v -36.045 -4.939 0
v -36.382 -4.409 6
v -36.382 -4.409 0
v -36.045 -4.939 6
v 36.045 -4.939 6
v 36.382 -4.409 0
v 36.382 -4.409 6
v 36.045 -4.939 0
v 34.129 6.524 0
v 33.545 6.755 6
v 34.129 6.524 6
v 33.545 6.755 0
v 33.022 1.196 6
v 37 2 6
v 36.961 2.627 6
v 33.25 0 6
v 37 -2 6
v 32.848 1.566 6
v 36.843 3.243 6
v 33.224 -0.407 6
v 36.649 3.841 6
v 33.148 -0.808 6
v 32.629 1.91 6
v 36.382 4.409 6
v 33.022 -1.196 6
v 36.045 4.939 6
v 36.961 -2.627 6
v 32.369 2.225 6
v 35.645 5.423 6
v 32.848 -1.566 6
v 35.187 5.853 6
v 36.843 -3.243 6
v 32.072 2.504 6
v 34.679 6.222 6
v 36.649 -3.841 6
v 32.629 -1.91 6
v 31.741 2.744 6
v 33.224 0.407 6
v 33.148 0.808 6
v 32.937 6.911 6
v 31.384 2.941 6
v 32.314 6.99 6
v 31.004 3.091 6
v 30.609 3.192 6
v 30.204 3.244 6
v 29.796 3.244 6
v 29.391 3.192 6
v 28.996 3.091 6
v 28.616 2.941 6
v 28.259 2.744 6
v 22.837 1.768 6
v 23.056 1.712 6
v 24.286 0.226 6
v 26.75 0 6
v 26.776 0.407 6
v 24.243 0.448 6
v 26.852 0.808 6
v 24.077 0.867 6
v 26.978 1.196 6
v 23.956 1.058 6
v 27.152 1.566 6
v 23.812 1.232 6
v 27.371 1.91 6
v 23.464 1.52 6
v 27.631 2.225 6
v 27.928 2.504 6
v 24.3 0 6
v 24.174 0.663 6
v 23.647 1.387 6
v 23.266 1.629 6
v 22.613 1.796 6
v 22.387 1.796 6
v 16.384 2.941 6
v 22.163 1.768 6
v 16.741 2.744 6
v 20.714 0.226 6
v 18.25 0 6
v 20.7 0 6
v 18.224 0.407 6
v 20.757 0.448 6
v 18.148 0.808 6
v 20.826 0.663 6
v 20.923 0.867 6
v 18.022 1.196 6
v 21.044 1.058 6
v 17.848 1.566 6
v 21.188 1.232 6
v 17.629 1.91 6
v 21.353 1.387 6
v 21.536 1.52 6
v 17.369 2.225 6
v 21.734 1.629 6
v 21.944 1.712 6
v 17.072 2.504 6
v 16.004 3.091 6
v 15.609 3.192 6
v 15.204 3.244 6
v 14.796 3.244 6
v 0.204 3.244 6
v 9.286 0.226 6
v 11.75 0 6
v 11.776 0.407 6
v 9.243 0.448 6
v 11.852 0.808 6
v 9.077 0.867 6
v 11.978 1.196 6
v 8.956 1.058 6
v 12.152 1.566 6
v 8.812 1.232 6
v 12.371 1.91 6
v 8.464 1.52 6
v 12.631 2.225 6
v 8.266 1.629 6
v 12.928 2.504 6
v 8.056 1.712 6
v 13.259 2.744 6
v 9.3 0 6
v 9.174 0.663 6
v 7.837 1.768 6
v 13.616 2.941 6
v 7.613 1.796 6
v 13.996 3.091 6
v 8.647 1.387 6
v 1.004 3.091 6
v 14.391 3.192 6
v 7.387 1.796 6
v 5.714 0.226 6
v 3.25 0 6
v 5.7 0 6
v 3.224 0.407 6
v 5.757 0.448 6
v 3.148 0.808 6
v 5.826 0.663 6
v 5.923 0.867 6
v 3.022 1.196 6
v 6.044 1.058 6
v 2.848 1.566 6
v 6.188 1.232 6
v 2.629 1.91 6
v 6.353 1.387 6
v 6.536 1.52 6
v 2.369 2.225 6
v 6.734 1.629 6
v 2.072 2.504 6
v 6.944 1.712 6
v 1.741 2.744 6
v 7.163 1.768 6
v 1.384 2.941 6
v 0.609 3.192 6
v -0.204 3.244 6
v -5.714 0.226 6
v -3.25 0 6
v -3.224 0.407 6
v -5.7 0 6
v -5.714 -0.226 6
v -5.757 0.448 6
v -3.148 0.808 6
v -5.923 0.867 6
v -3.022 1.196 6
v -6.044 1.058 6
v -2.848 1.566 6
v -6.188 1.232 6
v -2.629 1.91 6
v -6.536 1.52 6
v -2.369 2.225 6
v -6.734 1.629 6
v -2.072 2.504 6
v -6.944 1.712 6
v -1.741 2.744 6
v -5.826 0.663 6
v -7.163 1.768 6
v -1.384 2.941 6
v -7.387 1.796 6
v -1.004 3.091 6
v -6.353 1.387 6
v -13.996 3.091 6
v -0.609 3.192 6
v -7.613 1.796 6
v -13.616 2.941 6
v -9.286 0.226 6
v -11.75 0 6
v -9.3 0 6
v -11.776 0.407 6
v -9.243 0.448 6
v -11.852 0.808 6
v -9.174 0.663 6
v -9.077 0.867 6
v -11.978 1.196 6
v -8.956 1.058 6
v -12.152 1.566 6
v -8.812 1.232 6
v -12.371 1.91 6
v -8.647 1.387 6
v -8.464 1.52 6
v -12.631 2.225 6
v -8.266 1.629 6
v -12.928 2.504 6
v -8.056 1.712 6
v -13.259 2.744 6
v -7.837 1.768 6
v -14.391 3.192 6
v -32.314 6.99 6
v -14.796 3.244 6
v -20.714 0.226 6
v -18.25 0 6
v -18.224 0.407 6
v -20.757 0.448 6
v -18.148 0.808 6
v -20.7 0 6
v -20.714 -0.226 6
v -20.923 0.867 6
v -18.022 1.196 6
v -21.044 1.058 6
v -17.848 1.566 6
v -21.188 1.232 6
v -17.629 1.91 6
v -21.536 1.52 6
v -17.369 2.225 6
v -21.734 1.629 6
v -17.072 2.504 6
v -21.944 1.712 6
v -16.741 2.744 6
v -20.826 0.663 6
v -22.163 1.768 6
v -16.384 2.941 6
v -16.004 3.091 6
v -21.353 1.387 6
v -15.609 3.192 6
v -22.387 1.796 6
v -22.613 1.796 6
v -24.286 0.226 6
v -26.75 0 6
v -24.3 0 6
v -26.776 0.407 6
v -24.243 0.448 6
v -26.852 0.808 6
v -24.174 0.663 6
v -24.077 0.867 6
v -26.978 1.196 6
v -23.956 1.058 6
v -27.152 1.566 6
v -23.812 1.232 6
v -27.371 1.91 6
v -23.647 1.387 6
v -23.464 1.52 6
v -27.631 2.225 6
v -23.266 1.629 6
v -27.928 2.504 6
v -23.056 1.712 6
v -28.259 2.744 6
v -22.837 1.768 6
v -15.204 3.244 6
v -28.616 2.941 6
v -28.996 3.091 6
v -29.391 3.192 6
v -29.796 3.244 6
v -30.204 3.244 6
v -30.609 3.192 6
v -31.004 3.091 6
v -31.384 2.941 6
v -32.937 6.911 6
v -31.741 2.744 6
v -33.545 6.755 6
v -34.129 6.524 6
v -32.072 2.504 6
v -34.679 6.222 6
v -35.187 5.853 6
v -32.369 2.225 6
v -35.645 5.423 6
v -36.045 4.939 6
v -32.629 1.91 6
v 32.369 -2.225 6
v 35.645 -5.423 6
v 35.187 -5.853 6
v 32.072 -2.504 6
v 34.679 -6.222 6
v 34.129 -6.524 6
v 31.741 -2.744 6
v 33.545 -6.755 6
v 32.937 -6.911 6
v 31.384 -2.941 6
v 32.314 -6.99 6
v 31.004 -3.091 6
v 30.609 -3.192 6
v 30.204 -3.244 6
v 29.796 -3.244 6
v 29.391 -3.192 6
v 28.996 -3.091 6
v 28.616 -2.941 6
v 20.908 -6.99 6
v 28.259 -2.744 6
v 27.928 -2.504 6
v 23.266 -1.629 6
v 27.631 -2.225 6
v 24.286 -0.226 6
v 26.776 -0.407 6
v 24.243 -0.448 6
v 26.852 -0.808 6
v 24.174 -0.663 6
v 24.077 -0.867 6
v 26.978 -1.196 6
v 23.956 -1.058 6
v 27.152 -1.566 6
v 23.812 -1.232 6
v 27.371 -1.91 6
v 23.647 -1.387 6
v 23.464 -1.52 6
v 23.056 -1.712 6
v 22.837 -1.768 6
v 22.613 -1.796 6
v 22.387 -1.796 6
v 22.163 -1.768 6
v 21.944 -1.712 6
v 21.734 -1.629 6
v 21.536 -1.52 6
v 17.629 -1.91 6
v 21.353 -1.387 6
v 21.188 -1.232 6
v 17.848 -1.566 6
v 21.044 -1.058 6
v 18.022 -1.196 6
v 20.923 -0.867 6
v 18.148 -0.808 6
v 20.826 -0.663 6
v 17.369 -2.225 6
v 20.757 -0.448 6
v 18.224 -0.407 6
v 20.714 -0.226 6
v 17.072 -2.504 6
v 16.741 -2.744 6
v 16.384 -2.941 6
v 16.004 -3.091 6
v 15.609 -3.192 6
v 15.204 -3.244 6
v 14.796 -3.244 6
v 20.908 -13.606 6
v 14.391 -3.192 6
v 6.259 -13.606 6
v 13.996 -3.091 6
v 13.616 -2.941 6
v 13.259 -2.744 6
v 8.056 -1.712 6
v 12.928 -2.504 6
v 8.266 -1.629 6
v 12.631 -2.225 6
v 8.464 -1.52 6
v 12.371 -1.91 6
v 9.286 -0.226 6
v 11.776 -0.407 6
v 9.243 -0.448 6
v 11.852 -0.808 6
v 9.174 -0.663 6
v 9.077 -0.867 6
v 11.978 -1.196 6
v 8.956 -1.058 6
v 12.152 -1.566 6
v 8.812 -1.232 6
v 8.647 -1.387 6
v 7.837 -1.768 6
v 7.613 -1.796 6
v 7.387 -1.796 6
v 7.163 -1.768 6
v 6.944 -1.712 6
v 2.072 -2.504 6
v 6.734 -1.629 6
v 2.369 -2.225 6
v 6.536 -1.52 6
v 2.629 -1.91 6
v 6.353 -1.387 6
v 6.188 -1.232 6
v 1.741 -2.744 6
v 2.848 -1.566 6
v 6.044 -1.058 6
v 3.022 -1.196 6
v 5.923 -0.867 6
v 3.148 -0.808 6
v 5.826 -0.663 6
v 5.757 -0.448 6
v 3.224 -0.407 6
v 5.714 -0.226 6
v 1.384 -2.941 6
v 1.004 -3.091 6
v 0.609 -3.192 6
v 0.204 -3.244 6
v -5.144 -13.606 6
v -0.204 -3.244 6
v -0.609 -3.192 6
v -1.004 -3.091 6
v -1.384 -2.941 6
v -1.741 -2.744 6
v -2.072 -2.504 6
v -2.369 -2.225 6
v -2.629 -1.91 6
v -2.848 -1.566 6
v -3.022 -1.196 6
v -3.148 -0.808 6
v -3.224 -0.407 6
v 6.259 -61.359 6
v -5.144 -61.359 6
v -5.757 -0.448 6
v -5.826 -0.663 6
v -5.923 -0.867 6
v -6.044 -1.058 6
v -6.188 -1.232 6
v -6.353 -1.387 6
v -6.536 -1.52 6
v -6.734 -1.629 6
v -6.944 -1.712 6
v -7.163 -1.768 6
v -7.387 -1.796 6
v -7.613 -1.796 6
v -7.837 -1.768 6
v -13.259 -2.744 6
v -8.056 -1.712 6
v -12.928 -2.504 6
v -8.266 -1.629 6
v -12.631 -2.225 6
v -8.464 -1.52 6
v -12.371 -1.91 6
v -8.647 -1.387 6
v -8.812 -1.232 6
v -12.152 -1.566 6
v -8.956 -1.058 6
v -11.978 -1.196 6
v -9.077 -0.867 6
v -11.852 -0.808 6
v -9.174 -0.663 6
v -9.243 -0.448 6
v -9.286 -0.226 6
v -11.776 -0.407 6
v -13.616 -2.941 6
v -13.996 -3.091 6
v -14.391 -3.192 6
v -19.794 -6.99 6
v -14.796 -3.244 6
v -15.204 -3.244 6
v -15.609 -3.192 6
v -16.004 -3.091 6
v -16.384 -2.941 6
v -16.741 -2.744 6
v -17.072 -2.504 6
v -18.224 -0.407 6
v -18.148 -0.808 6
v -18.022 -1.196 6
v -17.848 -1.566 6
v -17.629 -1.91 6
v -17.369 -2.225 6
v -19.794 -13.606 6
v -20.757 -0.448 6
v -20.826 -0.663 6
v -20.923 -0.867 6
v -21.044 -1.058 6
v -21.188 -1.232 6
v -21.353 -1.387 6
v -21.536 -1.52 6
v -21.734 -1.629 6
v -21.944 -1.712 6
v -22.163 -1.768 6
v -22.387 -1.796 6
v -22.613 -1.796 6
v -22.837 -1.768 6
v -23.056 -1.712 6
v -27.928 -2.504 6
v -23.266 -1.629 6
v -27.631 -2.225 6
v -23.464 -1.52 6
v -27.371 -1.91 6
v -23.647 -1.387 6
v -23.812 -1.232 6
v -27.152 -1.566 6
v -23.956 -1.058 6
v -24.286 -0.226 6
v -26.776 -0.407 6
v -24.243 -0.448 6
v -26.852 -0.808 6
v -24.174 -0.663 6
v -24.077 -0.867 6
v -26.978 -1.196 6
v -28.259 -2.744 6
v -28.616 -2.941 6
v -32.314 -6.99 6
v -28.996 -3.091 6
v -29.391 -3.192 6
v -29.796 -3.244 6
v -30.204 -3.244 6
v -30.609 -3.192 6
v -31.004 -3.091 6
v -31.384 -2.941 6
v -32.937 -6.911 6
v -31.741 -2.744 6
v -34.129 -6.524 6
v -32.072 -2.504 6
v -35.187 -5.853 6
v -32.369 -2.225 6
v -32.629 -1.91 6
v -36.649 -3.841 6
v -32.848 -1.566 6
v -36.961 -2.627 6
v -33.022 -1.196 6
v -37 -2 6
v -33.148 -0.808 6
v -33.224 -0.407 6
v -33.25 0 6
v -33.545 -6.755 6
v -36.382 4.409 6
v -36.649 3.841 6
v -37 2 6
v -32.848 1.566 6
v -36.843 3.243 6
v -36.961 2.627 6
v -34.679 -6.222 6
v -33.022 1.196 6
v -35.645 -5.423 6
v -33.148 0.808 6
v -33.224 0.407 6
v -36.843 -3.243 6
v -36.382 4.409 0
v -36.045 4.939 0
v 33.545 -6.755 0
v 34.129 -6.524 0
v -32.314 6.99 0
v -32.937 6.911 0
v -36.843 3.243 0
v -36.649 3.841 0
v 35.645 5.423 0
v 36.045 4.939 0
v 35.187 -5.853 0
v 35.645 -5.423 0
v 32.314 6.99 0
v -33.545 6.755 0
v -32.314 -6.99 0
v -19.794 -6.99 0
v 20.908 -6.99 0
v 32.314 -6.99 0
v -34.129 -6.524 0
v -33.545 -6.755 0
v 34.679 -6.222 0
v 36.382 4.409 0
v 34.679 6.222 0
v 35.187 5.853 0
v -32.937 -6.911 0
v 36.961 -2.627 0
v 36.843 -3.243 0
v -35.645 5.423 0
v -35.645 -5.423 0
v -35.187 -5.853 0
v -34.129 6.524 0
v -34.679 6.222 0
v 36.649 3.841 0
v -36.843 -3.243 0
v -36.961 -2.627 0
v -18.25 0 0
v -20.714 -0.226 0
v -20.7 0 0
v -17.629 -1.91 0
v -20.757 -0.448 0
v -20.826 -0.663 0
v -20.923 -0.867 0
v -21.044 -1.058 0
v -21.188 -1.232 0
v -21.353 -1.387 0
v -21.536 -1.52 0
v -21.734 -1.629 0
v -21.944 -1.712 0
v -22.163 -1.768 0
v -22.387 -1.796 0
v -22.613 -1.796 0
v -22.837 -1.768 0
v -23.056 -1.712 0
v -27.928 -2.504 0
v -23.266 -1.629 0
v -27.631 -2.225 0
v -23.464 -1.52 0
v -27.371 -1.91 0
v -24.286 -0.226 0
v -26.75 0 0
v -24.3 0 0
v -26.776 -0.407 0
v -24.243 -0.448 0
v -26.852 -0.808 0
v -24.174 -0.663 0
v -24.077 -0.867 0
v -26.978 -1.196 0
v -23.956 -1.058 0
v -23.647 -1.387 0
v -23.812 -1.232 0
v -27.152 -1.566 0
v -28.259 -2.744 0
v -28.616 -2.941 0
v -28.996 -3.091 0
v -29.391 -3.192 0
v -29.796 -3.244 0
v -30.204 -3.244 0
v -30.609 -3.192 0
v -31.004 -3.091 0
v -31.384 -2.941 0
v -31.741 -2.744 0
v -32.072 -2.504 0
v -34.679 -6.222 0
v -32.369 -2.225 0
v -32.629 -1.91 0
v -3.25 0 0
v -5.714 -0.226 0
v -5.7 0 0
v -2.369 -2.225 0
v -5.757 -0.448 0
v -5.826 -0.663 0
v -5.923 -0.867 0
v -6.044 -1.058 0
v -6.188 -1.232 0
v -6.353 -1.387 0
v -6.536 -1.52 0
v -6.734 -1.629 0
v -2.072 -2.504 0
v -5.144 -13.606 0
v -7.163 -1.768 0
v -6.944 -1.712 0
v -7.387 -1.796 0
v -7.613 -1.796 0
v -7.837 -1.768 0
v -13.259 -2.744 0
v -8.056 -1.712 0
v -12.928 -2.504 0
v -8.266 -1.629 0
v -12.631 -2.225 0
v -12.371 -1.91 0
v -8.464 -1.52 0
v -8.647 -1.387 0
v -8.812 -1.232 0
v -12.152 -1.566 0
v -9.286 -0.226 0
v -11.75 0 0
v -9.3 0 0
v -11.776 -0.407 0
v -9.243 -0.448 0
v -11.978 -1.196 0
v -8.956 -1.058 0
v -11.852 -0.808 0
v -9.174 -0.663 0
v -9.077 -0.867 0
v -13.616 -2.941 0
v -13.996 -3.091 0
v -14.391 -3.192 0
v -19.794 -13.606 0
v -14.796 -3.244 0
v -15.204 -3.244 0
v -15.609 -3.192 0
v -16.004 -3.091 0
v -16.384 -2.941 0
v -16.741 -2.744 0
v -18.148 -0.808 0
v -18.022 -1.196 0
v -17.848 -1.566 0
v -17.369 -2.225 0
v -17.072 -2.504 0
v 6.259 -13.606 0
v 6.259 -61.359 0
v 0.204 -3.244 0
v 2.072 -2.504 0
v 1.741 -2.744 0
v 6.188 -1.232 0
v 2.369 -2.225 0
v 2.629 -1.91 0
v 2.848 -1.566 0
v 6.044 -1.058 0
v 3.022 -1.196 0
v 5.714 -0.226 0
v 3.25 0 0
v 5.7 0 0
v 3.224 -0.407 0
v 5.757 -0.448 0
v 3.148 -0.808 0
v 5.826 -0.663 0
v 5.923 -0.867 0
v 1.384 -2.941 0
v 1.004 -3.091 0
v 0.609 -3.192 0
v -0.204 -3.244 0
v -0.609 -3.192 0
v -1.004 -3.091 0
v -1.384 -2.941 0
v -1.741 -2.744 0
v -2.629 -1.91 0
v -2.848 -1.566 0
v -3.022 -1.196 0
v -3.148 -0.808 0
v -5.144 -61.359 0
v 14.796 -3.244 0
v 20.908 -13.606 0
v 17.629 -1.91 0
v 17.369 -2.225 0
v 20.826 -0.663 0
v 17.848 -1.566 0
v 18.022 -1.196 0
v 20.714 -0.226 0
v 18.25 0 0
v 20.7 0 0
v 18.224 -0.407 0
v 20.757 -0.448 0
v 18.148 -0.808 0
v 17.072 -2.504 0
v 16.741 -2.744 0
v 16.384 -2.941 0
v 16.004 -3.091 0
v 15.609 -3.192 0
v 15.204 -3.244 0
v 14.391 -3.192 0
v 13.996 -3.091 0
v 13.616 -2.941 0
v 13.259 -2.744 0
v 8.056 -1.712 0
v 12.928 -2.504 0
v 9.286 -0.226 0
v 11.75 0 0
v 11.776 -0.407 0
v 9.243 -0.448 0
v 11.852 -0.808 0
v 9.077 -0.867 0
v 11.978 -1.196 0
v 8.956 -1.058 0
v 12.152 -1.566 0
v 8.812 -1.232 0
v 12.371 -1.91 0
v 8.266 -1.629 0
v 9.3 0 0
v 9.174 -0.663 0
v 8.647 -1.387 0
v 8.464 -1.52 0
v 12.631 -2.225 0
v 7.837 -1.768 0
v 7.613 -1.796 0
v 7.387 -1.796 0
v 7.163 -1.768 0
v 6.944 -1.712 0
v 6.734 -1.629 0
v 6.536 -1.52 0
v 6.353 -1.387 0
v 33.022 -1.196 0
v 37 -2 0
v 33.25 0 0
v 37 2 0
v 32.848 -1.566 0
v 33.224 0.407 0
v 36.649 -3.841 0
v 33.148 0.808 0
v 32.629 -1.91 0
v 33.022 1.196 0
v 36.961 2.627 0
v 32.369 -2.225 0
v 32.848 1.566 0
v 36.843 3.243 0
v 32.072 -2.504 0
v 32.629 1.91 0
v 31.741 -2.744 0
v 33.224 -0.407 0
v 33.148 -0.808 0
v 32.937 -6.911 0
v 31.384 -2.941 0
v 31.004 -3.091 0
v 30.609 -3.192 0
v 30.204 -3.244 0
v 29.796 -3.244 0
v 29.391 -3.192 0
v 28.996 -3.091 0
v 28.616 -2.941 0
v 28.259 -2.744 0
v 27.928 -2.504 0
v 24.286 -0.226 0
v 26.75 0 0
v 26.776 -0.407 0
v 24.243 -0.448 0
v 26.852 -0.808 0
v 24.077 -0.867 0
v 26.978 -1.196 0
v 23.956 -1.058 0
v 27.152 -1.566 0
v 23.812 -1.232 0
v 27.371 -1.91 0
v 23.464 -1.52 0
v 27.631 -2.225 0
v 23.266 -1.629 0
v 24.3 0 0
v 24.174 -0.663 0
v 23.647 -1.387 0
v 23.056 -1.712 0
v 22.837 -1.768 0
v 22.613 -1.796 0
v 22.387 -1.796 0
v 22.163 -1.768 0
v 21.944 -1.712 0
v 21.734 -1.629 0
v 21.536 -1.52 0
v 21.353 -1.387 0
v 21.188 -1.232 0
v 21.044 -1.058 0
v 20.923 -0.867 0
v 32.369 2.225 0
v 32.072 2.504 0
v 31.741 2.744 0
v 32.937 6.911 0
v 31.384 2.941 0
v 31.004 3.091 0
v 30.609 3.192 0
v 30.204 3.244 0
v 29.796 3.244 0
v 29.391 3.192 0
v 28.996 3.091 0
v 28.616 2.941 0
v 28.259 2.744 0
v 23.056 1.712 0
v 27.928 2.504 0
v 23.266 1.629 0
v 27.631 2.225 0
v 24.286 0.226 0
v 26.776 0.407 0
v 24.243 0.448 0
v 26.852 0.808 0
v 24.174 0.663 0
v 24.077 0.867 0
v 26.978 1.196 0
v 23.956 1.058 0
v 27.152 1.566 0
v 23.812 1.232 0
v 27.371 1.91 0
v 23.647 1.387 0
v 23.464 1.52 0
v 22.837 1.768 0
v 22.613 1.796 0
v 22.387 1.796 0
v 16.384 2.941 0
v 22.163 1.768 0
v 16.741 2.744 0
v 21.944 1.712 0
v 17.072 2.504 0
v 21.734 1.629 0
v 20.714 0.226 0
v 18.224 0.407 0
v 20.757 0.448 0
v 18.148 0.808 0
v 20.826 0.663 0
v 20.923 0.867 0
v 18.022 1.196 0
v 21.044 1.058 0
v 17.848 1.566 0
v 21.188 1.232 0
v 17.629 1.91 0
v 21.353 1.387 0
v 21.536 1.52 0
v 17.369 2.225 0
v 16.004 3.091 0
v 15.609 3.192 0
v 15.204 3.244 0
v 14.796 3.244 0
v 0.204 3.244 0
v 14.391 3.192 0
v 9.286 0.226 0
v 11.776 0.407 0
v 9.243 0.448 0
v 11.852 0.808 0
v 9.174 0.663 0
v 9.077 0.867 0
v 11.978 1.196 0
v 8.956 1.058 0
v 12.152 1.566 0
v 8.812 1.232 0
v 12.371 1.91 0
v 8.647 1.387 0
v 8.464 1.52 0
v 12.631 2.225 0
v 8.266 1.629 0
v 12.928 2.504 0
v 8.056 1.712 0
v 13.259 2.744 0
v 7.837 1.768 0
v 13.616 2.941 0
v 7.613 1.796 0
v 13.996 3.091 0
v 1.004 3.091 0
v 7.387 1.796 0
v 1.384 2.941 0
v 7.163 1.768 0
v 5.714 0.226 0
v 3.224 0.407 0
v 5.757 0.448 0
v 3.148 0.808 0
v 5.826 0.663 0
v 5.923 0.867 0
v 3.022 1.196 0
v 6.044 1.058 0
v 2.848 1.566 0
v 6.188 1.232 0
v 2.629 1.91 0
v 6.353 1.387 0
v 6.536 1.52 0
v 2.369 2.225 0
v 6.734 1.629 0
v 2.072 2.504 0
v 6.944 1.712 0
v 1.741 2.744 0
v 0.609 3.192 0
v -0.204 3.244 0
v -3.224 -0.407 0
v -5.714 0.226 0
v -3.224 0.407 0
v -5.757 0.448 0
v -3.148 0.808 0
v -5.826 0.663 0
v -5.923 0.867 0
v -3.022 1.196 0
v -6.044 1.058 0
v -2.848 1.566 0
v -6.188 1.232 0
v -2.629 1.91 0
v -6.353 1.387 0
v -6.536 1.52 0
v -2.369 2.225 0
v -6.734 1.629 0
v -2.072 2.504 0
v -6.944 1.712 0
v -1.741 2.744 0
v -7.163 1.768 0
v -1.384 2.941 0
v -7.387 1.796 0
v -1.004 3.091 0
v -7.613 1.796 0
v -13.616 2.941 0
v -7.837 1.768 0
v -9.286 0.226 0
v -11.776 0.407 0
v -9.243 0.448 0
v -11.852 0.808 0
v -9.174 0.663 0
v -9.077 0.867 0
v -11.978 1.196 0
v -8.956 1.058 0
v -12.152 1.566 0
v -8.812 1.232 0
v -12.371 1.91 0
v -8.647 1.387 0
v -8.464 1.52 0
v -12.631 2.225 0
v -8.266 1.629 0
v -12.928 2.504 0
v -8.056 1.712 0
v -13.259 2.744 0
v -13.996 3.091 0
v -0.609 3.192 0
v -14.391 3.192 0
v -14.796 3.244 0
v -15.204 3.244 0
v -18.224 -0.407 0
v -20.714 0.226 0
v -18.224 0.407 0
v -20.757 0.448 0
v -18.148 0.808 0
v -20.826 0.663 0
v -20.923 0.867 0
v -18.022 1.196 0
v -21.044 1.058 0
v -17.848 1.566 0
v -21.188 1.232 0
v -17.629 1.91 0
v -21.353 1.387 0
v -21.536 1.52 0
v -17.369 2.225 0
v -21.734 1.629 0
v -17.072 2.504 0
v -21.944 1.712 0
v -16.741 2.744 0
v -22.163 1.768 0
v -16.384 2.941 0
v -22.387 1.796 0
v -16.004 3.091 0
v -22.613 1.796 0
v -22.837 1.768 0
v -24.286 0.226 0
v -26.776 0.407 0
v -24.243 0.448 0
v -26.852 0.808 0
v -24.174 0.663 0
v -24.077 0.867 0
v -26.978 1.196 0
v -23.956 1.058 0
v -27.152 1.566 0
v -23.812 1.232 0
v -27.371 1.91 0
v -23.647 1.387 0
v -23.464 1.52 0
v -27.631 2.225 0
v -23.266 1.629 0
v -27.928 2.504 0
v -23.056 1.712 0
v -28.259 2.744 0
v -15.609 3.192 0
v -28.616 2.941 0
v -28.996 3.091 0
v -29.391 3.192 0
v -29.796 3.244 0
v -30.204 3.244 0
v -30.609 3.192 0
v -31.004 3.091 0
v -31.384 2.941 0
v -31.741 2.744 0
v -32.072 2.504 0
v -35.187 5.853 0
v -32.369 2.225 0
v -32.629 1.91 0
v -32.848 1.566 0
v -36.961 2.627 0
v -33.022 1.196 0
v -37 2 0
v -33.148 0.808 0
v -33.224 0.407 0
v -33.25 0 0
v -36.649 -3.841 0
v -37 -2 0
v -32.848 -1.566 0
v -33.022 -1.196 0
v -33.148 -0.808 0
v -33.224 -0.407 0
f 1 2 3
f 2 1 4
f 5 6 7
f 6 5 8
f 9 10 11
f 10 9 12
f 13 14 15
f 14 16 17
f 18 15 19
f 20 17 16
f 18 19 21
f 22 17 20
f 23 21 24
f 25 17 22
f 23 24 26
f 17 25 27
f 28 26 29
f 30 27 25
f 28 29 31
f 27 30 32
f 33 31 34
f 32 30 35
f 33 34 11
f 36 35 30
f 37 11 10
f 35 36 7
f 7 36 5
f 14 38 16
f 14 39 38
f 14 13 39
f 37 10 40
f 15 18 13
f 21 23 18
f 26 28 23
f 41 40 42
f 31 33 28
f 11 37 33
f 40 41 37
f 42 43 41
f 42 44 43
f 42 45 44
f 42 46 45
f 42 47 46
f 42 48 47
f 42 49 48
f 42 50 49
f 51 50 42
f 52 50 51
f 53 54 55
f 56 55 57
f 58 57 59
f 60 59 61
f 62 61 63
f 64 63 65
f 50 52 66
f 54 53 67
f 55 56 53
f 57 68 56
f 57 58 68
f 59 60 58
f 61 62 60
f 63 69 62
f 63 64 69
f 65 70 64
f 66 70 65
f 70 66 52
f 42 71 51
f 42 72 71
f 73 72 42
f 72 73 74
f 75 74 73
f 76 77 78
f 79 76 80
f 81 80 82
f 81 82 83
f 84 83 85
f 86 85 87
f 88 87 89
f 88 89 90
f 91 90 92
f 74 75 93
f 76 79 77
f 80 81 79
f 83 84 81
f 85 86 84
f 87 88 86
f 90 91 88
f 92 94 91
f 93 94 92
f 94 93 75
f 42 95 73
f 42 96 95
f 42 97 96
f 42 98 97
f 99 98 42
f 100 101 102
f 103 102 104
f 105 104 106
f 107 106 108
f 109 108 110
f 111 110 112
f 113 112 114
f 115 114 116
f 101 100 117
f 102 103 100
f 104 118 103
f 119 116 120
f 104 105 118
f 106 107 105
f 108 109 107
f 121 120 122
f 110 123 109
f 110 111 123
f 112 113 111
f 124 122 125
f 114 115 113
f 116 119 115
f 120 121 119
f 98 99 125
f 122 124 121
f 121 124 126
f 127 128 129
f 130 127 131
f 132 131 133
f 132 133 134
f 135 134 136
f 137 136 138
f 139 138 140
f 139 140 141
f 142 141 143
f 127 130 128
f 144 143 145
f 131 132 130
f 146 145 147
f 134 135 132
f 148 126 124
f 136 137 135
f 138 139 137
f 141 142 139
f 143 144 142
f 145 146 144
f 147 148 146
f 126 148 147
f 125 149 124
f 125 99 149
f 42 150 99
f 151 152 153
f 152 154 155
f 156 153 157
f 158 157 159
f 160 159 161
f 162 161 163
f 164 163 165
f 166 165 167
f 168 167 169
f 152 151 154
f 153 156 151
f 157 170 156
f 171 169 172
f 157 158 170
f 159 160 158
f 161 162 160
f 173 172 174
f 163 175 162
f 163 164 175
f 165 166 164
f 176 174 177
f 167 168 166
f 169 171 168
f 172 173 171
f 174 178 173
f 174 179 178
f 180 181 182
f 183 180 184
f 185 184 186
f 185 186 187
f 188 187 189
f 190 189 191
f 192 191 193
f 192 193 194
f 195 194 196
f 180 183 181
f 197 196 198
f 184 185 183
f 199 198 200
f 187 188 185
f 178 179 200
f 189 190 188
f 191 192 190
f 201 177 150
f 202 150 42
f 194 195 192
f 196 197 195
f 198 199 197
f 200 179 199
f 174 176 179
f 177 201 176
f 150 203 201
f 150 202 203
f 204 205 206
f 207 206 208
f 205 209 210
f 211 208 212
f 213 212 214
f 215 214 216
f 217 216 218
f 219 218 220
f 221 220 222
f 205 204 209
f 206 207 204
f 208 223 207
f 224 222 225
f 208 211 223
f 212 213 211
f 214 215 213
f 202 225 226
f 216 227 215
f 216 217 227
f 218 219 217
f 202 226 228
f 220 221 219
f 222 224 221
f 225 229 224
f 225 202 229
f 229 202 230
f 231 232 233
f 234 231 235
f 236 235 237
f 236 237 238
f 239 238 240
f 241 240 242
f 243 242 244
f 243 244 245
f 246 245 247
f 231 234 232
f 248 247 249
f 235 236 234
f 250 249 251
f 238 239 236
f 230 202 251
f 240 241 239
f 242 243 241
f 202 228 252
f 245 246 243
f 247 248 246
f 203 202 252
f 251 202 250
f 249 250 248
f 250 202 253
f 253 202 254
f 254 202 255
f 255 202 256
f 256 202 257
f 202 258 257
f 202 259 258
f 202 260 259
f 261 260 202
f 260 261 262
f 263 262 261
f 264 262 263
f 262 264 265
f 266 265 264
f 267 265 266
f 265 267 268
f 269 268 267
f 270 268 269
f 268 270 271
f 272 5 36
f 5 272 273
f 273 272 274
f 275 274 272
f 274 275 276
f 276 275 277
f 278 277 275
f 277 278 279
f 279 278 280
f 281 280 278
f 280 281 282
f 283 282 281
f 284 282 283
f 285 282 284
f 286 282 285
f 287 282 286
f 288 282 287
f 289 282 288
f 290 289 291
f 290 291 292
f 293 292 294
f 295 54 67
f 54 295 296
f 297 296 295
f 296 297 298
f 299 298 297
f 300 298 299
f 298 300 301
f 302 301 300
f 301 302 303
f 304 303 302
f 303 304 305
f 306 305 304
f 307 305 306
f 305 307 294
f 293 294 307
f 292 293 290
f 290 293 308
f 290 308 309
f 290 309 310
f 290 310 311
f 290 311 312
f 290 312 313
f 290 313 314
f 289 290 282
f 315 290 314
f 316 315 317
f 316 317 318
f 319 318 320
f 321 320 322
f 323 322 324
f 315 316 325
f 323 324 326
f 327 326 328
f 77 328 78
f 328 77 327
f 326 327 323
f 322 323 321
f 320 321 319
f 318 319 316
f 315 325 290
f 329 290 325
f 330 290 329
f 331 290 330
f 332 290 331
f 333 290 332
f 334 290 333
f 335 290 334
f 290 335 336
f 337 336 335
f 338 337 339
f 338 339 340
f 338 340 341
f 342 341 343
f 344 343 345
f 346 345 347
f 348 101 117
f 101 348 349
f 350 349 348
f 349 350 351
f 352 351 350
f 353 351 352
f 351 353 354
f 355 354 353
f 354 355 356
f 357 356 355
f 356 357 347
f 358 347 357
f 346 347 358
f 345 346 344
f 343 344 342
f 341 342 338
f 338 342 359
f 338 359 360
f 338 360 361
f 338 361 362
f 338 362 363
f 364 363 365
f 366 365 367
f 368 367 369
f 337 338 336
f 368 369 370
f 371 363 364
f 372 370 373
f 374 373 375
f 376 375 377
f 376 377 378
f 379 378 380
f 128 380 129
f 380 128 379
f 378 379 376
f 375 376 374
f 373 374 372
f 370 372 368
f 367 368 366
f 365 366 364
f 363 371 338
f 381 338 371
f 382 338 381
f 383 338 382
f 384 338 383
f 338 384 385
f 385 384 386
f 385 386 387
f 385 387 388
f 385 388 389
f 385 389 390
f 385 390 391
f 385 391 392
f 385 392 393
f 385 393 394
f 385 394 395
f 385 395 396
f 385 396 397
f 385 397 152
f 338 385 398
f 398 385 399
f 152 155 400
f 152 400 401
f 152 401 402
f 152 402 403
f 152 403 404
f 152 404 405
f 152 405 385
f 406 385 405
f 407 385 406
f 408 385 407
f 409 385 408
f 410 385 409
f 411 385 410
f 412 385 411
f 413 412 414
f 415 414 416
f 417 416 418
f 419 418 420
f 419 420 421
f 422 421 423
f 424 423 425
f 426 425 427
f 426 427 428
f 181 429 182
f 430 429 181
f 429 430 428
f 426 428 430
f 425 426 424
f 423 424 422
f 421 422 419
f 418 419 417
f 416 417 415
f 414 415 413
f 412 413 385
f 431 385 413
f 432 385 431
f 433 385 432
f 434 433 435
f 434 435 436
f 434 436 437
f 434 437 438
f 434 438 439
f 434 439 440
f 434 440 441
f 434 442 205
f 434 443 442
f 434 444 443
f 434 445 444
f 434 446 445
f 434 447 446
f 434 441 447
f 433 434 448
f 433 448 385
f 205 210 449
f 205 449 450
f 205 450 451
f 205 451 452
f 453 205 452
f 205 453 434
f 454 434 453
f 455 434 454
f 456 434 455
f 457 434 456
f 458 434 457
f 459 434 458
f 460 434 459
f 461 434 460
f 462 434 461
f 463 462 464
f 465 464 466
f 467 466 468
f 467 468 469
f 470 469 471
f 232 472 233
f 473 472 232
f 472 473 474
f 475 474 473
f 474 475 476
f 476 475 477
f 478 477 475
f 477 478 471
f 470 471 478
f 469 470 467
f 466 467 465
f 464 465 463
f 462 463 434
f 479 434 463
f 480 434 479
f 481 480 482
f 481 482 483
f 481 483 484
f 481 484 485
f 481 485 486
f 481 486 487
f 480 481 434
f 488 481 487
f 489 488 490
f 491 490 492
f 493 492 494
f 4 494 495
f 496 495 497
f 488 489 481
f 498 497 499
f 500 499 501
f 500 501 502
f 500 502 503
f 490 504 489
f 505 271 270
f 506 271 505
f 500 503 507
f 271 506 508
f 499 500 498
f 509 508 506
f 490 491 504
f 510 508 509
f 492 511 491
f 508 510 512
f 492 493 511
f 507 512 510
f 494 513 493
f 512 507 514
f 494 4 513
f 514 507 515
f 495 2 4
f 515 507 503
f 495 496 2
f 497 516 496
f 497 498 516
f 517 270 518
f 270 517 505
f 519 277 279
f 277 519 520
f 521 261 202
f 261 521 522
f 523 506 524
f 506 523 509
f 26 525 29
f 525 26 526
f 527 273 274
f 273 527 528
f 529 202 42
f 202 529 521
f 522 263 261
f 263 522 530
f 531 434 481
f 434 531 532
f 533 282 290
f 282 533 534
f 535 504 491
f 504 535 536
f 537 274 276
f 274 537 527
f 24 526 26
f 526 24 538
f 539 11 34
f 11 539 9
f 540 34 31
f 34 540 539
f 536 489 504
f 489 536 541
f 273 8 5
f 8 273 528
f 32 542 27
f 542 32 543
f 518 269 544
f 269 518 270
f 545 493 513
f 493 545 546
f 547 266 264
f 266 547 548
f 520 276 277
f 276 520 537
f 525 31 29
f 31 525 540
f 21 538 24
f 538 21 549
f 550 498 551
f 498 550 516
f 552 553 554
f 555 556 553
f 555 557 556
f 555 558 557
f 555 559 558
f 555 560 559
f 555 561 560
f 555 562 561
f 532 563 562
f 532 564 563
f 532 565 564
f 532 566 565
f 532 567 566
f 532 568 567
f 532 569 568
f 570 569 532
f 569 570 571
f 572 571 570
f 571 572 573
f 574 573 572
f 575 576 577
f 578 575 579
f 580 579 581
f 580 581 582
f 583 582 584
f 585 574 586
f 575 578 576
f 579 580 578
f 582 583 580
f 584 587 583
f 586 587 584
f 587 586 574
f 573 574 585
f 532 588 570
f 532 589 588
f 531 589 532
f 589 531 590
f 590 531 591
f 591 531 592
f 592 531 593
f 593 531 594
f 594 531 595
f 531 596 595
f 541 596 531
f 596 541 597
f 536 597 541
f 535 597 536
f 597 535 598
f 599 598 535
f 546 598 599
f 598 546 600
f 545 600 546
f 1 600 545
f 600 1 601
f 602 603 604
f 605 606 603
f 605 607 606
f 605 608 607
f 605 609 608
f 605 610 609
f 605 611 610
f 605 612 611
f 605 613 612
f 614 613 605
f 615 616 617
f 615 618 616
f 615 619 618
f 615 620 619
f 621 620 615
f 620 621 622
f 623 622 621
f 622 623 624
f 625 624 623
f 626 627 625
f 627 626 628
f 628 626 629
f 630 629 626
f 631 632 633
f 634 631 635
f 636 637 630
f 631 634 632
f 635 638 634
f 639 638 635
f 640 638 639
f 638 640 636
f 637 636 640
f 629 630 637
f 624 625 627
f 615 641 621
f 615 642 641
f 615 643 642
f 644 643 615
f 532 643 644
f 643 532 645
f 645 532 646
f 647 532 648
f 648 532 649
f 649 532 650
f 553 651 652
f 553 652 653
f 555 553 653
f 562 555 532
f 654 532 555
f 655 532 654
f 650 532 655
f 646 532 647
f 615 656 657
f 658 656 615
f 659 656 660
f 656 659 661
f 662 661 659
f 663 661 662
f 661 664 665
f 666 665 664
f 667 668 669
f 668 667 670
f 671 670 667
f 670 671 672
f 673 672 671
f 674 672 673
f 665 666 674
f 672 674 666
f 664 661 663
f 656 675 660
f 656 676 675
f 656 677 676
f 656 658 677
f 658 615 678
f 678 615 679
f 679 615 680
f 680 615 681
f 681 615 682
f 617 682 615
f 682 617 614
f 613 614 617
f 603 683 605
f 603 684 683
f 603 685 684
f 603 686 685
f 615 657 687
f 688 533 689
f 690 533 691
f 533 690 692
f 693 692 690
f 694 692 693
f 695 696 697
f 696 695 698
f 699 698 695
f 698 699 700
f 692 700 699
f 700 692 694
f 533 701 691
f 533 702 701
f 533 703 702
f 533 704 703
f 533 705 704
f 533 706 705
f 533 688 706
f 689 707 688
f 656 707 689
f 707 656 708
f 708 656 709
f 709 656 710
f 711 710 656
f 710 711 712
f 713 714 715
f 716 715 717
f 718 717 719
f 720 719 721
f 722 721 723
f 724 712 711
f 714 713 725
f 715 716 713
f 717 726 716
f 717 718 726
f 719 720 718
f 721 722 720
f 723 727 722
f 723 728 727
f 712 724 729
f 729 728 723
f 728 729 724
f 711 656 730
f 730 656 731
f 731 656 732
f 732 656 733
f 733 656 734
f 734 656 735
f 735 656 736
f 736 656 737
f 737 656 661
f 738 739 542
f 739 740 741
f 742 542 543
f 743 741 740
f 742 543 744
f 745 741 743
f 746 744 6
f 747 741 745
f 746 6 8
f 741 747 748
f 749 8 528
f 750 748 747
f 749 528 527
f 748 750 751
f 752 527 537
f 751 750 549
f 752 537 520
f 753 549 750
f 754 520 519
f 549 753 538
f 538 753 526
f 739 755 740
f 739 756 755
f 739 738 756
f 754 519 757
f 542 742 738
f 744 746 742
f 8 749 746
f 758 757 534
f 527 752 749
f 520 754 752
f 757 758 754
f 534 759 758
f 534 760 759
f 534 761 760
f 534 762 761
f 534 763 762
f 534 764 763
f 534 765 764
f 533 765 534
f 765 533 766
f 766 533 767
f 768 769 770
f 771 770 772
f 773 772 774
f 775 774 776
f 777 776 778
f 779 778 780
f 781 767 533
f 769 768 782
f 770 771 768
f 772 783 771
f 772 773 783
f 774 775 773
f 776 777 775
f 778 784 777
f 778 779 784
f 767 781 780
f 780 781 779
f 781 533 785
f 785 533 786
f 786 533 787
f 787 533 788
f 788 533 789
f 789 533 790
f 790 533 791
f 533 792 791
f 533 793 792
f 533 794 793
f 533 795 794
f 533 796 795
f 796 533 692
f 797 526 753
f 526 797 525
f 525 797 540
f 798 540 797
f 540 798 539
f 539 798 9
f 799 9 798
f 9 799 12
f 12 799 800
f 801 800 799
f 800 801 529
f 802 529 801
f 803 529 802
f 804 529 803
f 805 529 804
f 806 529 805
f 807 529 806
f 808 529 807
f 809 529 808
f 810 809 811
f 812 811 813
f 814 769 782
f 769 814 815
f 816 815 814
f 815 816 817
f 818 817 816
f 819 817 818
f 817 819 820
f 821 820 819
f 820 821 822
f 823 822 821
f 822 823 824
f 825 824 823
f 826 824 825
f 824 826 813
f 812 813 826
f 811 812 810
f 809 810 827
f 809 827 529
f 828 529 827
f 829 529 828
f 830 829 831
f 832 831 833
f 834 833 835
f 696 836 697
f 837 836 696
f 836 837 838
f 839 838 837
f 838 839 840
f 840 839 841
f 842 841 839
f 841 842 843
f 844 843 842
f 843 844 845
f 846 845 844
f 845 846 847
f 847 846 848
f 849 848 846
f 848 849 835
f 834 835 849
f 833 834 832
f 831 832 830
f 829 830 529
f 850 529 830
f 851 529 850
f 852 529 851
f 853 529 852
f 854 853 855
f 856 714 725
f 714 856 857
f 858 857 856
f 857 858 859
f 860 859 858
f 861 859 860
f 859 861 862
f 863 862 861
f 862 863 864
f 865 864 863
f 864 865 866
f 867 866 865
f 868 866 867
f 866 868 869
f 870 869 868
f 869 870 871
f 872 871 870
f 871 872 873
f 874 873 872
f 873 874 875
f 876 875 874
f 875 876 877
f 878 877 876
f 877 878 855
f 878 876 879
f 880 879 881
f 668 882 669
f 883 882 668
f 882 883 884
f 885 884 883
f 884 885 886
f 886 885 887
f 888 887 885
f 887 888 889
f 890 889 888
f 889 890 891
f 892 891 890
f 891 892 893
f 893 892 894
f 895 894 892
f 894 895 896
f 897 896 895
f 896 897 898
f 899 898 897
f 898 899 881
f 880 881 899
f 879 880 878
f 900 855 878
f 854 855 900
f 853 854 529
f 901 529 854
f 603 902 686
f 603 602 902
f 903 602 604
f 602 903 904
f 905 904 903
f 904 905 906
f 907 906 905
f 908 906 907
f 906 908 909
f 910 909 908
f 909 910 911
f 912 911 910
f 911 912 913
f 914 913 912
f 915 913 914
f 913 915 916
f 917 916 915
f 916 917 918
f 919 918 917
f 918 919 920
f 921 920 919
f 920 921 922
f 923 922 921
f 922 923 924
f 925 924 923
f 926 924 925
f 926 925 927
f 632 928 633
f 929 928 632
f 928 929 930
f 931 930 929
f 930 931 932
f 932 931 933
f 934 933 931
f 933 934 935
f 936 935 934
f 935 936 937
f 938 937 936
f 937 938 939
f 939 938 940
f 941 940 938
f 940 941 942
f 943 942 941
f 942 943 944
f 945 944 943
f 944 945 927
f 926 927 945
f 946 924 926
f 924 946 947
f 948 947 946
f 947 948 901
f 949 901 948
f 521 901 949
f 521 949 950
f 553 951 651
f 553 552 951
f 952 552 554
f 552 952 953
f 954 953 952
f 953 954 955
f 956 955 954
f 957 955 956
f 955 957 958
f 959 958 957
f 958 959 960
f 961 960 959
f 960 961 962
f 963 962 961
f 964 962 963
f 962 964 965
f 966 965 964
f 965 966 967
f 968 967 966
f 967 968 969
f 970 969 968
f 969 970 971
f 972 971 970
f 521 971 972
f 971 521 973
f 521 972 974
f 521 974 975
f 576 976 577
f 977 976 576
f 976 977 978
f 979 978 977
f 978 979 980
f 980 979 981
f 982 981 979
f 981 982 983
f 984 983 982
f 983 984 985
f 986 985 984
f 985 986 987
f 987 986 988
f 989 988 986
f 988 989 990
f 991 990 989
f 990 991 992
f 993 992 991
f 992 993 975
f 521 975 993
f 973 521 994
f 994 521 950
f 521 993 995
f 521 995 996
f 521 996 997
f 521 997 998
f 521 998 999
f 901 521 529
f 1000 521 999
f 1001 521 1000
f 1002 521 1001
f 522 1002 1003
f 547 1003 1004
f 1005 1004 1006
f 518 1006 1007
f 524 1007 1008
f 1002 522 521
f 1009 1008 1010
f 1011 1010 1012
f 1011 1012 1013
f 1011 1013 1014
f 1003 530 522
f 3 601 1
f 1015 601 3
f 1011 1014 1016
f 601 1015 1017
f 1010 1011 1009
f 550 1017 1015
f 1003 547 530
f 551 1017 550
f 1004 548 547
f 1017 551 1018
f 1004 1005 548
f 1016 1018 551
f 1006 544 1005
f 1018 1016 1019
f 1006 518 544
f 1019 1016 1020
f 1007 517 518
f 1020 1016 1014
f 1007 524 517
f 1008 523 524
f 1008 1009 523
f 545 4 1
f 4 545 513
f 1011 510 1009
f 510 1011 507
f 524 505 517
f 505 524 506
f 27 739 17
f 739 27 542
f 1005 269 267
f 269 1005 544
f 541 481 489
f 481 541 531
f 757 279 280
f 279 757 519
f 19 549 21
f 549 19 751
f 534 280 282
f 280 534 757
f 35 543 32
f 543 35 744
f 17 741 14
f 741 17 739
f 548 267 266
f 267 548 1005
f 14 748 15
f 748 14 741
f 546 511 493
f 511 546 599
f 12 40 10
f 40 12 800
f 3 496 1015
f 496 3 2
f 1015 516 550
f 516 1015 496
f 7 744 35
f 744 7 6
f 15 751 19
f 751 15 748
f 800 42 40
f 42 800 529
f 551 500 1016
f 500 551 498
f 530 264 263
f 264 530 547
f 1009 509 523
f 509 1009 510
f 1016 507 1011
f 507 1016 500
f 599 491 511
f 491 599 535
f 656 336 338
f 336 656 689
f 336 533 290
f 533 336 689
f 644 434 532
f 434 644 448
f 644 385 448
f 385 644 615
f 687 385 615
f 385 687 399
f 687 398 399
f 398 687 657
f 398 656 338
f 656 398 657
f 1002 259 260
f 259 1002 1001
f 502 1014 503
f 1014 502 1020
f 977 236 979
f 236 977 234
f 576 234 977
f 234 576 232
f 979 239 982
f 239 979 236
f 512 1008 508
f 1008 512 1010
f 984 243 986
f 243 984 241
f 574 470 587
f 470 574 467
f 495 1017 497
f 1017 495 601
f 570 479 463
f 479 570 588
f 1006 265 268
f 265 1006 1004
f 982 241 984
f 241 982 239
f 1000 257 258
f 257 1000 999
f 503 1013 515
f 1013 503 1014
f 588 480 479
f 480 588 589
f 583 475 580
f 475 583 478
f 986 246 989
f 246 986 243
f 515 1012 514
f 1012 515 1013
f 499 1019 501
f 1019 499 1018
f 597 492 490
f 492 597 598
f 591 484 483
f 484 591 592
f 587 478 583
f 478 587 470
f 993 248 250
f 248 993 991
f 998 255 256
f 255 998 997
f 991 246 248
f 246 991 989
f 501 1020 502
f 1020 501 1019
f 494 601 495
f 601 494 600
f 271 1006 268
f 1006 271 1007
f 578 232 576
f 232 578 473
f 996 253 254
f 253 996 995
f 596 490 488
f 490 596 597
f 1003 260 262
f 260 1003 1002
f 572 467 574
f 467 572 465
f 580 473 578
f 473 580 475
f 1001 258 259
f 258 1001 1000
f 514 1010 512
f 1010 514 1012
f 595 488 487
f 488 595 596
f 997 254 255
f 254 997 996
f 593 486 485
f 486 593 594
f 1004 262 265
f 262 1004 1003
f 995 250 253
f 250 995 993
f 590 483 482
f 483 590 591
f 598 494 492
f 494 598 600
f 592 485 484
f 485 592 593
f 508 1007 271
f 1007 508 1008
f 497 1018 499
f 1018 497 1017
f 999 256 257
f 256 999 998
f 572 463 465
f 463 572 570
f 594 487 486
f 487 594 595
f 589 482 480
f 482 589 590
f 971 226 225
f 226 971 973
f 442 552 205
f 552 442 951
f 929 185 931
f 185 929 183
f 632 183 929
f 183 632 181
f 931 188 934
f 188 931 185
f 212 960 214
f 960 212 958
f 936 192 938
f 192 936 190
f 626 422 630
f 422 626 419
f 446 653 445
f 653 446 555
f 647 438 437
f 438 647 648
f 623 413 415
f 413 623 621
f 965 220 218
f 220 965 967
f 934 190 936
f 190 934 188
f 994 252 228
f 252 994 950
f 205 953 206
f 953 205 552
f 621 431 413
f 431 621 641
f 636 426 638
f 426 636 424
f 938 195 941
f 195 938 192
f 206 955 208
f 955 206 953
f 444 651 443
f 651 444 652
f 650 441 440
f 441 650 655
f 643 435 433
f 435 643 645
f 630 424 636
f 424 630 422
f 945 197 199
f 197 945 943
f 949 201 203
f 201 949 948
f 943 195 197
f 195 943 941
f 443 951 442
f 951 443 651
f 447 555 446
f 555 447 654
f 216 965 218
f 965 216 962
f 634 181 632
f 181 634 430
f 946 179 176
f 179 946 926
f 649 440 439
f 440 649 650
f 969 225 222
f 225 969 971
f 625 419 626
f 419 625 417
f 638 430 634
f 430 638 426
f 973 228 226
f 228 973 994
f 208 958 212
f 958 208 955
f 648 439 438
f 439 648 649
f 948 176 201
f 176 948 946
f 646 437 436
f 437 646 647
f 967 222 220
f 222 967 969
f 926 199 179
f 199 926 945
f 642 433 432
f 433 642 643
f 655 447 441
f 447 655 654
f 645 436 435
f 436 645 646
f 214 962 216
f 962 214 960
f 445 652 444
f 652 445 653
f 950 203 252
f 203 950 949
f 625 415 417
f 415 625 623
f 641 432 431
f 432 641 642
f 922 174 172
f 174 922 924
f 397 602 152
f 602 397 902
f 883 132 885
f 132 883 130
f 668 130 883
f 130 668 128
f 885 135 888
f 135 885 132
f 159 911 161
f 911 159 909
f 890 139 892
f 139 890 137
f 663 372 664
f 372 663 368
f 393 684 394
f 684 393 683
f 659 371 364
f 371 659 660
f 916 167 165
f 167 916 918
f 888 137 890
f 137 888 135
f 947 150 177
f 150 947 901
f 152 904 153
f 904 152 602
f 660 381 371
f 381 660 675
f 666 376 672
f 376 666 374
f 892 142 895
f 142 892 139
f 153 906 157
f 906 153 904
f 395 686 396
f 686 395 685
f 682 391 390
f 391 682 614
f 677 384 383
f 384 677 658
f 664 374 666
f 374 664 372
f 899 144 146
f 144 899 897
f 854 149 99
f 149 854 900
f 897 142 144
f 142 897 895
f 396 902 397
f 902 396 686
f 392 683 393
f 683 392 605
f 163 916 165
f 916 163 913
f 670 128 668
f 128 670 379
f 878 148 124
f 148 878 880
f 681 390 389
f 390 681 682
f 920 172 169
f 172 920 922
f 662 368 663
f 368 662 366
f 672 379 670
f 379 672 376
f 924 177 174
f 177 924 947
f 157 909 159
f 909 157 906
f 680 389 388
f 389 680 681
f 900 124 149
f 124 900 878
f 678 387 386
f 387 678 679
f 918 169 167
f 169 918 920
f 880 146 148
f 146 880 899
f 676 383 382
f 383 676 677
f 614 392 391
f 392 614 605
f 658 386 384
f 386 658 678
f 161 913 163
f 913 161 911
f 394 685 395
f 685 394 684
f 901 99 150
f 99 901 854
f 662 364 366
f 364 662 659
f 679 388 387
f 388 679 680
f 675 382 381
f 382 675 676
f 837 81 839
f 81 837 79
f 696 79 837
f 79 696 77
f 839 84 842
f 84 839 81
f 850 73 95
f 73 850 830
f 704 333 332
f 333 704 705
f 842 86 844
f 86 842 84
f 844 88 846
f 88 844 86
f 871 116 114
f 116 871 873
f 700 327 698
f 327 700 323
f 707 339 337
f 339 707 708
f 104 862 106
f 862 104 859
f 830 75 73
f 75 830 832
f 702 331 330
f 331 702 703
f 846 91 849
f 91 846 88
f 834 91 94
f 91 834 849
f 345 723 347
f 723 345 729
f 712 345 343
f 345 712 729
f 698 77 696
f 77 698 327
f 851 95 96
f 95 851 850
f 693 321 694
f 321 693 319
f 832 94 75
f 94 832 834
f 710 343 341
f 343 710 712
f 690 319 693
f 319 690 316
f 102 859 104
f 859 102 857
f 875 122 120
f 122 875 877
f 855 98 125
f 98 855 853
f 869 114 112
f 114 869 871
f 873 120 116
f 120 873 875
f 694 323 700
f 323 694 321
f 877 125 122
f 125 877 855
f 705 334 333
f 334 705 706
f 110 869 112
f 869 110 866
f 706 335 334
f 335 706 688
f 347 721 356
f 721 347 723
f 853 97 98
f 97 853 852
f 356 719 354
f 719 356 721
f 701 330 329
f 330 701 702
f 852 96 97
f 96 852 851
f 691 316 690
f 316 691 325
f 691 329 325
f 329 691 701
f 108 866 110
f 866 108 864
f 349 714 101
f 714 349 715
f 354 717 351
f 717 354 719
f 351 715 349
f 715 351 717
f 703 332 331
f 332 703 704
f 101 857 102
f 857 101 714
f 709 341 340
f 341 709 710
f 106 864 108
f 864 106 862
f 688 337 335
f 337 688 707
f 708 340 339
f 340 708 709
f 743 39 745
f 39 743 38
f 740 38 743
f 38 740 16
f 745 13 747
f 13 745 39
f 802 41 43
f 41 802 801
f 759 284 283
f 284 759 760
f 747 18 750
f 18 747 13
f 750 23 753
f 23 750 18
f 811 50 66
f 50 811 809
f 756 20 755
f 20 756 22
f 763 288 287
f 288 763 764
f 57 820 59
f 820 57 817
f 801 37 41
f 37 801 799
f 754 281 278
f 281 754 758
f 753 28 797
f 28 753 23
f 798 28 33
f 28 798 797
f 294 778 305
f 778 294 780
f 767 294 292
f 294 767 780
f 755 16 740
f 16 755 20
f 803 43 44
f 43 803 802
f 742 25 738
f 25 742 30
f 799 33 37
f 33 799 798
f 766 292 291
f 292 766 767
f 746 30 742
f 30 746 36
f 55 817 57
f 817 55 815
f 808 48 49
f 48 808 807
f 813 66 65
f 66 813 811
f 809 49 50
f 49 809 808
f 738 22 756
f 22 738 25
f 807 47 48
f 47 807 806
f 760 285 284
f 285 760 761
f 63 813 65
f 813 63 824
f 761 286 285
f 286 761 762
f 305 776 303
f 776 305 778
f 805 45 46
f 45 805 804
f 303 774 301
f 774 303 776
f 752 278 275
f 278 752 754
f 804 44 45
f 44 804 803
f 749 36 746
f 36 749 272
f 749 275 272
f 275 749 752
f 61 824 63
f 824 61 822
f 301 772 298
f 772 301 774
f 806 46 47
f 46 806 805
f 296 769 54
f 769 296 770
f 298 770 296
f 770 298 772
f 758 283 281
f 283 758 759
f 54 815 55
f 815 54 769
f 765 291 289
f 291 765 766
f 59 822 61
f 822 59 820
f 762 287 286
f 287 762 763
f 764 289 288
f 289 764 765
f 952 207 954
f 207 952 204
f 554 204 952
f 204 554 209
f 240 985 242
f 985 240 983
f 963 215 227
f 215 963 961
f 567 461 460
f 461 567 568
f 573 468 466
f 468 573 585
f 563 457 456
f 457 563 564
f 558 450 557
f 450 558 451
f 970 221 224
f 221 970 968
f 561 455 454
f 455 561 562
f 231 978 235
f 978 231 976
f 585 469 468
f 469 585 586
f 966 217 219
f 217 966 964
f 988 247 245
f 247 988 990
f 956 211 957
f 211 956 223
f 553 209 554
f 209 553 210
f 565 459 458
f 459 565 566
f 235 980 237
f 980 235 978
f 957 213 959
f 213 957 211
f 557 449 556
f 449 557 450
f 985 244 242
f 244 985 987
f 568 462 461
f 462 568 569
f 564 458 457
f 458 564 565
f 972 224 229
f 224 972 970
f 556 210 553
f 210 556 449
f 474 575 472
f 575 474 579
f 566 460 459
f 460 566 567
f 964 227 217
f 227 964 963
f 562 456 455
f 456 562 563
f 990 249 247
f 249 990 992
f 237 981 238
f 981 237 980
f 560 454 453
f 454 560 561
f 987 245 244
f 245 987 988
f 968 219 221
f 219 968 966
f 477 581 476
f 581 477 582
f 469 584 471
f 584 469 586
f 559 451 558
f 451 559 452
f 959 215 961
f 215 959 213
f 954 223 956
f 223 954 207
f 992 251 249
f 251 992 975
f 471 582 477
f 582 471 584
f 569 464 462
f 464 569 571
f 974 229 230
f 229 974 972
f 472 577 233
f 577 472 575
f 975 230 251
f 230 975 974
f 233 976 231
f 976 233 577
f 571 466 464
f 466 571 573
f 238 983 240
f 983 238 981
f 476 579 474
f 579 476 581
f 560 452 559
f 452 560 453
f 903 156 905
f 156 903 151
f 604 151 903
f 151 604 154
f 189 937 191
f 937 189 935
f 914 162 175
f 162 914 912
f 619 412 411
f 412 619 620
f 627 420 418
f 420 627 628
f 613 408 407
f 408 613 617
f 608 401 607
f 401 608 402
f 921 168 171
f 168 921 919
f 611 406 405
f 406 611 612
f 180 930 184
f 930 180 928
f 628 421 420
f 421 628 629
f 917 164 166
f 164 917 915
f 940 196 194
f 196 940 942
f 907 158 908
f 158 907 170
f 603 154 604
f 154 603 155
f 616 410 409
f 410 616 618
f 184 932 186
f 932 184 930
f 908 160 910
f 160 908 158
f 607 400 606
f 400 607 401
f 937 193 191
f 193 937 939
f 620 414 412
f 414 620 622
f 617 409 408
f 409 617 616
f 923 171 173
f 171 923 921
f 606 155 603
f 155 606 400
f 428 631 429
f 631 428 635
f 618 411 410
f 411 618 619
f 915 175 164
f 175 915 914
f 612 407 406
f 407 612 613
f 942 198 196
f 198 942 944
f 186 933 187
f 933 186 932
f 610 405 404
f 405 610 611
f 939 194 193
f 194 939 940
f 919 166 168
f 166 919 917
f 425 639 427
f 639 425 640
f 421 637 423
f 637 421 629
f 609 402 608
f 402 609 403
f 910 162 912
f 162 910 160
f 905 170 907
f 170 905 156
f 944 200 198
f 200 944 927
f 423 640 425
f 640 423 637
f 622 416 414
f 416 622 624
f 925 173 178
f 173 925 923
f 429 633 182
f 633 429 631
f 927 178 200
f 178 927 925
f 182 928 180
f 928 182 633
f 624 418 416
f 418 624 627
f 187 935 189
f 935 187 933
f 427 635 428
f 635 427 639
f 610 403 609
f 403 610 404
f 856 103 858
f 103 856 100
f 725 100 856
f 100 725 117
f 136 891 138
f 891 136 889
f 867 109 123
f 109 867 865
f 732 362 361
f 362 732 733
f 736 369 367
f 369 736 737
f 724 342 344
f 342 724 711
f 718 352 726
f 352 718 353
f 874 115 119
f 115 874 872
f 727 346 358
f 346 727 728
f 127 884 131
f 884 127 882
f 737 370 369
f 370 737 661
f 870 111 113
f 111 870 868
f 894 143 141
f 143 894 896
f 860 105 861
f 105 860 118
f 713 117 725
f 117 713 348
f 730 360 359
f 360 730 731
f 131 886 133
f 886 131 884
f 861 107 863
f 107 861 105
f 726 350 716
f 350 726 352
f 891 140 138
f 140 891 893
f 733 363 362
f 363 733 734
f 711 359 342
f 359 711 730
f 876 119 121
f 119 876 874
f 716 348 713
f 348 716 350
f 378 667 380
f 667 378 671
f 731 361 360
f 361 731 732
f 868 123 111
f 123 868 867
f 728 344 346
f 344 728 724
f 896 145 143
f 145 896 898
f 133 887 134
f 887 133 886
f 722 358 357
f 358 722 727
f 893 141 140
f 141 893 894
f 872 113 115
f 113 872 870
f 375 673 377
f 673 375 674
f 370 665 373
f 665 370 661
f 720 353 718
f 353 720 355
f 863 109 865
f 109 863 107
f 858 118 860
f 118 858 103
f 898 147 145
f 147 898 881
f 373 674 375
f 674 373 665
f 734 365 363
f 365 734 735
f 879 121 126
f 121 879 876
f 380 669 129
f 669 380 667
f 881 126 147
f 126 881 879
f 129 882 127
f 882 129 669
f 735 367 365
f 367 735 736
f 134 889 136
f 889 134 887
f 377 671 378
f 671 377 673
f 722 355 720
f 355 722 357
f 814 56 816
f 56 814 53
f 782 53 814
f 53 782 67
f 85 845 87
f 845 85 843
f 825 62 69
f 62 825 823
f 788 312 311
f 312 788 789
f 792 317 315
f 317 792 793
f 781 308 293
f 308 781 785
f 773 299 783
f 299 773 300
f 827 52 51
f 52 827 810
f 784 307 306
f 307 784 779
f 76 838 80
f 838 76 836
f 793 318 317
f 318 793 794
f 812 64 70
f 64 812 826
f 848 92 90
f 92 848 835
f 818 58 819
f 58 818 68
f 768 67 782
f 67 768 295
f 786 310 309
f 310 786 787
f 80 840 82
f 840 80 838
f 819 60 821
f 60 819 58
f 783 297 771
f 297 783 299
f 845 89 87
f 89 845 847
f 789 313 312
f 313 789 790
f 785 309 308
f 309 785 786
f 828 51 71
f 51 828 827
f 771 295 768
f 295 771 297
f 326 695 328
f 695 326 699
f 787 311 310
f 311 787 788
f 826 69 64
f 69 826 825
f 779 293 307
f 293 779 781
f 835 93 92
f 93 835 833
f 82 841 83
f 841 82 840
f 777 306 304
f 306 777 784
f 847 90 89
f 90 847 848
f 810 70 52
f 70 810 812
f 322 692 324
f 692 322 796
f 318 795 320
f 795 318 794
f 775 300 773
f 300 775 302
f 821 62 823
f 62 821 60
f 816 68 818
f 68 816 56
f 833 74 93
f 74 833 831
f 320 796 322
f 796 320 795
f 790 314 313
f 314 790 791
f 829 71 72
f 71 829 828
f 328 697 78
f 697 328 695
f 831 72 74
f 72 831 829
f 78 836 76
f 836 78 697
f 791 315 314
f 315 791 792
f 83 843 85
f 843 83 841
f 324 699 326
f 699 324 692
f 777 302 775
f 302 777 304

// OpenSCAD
$fn = 50;


difference() {
	union() {
		hull() {
			translate(v = [-32.0000000000, 2.0000000000, 0]) {
				cylinder(h = 6, r = 5);
			}
			translate(v = [32.0000000000, 2.0000000000, 0]) {
				cylinder(h = 6, r = 5);
			}
			translate(v = [-32.0000000000, -2.0000000000, 0]) {
				cylinder(h = 6, r = 5);
			}
			translate(v = [32.0000000000, -2.0000000000, 0]) {
				cylinder(h = 6, r = 5);
			}
		}
		translate(v = [0, -5, 0]) {
			linear_extrude(height = 6) {
				text(font = "DejaVu Sans Mono:style=Bold", halign = "center", size = 57.0000000000, text = "T", valign = "top");
			}
		}
	}
	union() {
		translate(v = [-30.0000000000, 0.0000000000, 0]) {
			translate(v = [0, 0, -100]) {
				cylinder(h = 200, r = 3.2500000000);
			}
		}
		translate(v = [-15.0000000000, 0.0000000000, 0]) {
			translate(v = [0, 0, -100]) {
				cylinder(h = 200, r = 3.2500000000);
			}
		}
		translate(v = [0, 0, -100]) {
			cylinder(h = 200, r = 3.2500000000);
		}
		translate(v = [15.0000000000, 0.0000000000, 0]) {
			translate(v = [0, 0, -100]) {
				cylinder(h = 200, r = 3.2500000000);
			}
		}
		translate(v = [30.0000000000, 0.0000000000, 0]) {
			translate(v = [0, 0, -100]) {
				cylinder(h = 200, r = 3.2500000000);
			}
		}
		translate(v = [-30.0000000000, 0.0000000000, 0]) {
			translate(v = [0, 0, -100]) {
				cylinder(h = 200, r = 1.8000000000);
			}
		}
		translate(v = [-22.5000000000, 0.0000000000, 0]) {
			translate(v = [0, 0, -100]) {
				cylinder(h = 200, r = 1.8000000000);
			}
		}
		translate(v = [-15.0000000000, 0.0000000000, 0]) {
			translate(v = [0, 0, -100]) {
				cylinder(h = 200, r = 1.8000000000);
			}
		}
		translate(v = [-7.5000000000, 0.0000000000, 0]) {
			translate(v = [0, 0, -100]) {
				cylinder(h = 200, r = 1.8000000000);
			}
		}
		translate(v = [0, 0, -100]) {
			cylinder(h = 200, r = 1.8000000000);
		}
		translate(v = [7.5000000000, 0.0000000000, 0]) {
			translate(v = [0, 0, -100]) {
				cylinder(h = 200, r = 1.8000000000);
			}
		}
		translate(v = [15.0000000000, 0.0000000000, 0]) {
			translate(v = [0, 0, -100]) {
				cylinder(h = 200, r = 1.8000000000);
			}
		}
		translate(v = [22.5000000000, 0.0000000000, 0]) {
			translate(v = [0, 0, -100]) {
				cylinder(h = 200, r = 1.8000000000);
			}
		}
		translate(v = [30.0000000000, 0.0000000000, 0]) {
			translate(v = [0, 0, -100]) {
				cylinder(h = 200, r = 1.8000000000);
			}
		}
	}
}
